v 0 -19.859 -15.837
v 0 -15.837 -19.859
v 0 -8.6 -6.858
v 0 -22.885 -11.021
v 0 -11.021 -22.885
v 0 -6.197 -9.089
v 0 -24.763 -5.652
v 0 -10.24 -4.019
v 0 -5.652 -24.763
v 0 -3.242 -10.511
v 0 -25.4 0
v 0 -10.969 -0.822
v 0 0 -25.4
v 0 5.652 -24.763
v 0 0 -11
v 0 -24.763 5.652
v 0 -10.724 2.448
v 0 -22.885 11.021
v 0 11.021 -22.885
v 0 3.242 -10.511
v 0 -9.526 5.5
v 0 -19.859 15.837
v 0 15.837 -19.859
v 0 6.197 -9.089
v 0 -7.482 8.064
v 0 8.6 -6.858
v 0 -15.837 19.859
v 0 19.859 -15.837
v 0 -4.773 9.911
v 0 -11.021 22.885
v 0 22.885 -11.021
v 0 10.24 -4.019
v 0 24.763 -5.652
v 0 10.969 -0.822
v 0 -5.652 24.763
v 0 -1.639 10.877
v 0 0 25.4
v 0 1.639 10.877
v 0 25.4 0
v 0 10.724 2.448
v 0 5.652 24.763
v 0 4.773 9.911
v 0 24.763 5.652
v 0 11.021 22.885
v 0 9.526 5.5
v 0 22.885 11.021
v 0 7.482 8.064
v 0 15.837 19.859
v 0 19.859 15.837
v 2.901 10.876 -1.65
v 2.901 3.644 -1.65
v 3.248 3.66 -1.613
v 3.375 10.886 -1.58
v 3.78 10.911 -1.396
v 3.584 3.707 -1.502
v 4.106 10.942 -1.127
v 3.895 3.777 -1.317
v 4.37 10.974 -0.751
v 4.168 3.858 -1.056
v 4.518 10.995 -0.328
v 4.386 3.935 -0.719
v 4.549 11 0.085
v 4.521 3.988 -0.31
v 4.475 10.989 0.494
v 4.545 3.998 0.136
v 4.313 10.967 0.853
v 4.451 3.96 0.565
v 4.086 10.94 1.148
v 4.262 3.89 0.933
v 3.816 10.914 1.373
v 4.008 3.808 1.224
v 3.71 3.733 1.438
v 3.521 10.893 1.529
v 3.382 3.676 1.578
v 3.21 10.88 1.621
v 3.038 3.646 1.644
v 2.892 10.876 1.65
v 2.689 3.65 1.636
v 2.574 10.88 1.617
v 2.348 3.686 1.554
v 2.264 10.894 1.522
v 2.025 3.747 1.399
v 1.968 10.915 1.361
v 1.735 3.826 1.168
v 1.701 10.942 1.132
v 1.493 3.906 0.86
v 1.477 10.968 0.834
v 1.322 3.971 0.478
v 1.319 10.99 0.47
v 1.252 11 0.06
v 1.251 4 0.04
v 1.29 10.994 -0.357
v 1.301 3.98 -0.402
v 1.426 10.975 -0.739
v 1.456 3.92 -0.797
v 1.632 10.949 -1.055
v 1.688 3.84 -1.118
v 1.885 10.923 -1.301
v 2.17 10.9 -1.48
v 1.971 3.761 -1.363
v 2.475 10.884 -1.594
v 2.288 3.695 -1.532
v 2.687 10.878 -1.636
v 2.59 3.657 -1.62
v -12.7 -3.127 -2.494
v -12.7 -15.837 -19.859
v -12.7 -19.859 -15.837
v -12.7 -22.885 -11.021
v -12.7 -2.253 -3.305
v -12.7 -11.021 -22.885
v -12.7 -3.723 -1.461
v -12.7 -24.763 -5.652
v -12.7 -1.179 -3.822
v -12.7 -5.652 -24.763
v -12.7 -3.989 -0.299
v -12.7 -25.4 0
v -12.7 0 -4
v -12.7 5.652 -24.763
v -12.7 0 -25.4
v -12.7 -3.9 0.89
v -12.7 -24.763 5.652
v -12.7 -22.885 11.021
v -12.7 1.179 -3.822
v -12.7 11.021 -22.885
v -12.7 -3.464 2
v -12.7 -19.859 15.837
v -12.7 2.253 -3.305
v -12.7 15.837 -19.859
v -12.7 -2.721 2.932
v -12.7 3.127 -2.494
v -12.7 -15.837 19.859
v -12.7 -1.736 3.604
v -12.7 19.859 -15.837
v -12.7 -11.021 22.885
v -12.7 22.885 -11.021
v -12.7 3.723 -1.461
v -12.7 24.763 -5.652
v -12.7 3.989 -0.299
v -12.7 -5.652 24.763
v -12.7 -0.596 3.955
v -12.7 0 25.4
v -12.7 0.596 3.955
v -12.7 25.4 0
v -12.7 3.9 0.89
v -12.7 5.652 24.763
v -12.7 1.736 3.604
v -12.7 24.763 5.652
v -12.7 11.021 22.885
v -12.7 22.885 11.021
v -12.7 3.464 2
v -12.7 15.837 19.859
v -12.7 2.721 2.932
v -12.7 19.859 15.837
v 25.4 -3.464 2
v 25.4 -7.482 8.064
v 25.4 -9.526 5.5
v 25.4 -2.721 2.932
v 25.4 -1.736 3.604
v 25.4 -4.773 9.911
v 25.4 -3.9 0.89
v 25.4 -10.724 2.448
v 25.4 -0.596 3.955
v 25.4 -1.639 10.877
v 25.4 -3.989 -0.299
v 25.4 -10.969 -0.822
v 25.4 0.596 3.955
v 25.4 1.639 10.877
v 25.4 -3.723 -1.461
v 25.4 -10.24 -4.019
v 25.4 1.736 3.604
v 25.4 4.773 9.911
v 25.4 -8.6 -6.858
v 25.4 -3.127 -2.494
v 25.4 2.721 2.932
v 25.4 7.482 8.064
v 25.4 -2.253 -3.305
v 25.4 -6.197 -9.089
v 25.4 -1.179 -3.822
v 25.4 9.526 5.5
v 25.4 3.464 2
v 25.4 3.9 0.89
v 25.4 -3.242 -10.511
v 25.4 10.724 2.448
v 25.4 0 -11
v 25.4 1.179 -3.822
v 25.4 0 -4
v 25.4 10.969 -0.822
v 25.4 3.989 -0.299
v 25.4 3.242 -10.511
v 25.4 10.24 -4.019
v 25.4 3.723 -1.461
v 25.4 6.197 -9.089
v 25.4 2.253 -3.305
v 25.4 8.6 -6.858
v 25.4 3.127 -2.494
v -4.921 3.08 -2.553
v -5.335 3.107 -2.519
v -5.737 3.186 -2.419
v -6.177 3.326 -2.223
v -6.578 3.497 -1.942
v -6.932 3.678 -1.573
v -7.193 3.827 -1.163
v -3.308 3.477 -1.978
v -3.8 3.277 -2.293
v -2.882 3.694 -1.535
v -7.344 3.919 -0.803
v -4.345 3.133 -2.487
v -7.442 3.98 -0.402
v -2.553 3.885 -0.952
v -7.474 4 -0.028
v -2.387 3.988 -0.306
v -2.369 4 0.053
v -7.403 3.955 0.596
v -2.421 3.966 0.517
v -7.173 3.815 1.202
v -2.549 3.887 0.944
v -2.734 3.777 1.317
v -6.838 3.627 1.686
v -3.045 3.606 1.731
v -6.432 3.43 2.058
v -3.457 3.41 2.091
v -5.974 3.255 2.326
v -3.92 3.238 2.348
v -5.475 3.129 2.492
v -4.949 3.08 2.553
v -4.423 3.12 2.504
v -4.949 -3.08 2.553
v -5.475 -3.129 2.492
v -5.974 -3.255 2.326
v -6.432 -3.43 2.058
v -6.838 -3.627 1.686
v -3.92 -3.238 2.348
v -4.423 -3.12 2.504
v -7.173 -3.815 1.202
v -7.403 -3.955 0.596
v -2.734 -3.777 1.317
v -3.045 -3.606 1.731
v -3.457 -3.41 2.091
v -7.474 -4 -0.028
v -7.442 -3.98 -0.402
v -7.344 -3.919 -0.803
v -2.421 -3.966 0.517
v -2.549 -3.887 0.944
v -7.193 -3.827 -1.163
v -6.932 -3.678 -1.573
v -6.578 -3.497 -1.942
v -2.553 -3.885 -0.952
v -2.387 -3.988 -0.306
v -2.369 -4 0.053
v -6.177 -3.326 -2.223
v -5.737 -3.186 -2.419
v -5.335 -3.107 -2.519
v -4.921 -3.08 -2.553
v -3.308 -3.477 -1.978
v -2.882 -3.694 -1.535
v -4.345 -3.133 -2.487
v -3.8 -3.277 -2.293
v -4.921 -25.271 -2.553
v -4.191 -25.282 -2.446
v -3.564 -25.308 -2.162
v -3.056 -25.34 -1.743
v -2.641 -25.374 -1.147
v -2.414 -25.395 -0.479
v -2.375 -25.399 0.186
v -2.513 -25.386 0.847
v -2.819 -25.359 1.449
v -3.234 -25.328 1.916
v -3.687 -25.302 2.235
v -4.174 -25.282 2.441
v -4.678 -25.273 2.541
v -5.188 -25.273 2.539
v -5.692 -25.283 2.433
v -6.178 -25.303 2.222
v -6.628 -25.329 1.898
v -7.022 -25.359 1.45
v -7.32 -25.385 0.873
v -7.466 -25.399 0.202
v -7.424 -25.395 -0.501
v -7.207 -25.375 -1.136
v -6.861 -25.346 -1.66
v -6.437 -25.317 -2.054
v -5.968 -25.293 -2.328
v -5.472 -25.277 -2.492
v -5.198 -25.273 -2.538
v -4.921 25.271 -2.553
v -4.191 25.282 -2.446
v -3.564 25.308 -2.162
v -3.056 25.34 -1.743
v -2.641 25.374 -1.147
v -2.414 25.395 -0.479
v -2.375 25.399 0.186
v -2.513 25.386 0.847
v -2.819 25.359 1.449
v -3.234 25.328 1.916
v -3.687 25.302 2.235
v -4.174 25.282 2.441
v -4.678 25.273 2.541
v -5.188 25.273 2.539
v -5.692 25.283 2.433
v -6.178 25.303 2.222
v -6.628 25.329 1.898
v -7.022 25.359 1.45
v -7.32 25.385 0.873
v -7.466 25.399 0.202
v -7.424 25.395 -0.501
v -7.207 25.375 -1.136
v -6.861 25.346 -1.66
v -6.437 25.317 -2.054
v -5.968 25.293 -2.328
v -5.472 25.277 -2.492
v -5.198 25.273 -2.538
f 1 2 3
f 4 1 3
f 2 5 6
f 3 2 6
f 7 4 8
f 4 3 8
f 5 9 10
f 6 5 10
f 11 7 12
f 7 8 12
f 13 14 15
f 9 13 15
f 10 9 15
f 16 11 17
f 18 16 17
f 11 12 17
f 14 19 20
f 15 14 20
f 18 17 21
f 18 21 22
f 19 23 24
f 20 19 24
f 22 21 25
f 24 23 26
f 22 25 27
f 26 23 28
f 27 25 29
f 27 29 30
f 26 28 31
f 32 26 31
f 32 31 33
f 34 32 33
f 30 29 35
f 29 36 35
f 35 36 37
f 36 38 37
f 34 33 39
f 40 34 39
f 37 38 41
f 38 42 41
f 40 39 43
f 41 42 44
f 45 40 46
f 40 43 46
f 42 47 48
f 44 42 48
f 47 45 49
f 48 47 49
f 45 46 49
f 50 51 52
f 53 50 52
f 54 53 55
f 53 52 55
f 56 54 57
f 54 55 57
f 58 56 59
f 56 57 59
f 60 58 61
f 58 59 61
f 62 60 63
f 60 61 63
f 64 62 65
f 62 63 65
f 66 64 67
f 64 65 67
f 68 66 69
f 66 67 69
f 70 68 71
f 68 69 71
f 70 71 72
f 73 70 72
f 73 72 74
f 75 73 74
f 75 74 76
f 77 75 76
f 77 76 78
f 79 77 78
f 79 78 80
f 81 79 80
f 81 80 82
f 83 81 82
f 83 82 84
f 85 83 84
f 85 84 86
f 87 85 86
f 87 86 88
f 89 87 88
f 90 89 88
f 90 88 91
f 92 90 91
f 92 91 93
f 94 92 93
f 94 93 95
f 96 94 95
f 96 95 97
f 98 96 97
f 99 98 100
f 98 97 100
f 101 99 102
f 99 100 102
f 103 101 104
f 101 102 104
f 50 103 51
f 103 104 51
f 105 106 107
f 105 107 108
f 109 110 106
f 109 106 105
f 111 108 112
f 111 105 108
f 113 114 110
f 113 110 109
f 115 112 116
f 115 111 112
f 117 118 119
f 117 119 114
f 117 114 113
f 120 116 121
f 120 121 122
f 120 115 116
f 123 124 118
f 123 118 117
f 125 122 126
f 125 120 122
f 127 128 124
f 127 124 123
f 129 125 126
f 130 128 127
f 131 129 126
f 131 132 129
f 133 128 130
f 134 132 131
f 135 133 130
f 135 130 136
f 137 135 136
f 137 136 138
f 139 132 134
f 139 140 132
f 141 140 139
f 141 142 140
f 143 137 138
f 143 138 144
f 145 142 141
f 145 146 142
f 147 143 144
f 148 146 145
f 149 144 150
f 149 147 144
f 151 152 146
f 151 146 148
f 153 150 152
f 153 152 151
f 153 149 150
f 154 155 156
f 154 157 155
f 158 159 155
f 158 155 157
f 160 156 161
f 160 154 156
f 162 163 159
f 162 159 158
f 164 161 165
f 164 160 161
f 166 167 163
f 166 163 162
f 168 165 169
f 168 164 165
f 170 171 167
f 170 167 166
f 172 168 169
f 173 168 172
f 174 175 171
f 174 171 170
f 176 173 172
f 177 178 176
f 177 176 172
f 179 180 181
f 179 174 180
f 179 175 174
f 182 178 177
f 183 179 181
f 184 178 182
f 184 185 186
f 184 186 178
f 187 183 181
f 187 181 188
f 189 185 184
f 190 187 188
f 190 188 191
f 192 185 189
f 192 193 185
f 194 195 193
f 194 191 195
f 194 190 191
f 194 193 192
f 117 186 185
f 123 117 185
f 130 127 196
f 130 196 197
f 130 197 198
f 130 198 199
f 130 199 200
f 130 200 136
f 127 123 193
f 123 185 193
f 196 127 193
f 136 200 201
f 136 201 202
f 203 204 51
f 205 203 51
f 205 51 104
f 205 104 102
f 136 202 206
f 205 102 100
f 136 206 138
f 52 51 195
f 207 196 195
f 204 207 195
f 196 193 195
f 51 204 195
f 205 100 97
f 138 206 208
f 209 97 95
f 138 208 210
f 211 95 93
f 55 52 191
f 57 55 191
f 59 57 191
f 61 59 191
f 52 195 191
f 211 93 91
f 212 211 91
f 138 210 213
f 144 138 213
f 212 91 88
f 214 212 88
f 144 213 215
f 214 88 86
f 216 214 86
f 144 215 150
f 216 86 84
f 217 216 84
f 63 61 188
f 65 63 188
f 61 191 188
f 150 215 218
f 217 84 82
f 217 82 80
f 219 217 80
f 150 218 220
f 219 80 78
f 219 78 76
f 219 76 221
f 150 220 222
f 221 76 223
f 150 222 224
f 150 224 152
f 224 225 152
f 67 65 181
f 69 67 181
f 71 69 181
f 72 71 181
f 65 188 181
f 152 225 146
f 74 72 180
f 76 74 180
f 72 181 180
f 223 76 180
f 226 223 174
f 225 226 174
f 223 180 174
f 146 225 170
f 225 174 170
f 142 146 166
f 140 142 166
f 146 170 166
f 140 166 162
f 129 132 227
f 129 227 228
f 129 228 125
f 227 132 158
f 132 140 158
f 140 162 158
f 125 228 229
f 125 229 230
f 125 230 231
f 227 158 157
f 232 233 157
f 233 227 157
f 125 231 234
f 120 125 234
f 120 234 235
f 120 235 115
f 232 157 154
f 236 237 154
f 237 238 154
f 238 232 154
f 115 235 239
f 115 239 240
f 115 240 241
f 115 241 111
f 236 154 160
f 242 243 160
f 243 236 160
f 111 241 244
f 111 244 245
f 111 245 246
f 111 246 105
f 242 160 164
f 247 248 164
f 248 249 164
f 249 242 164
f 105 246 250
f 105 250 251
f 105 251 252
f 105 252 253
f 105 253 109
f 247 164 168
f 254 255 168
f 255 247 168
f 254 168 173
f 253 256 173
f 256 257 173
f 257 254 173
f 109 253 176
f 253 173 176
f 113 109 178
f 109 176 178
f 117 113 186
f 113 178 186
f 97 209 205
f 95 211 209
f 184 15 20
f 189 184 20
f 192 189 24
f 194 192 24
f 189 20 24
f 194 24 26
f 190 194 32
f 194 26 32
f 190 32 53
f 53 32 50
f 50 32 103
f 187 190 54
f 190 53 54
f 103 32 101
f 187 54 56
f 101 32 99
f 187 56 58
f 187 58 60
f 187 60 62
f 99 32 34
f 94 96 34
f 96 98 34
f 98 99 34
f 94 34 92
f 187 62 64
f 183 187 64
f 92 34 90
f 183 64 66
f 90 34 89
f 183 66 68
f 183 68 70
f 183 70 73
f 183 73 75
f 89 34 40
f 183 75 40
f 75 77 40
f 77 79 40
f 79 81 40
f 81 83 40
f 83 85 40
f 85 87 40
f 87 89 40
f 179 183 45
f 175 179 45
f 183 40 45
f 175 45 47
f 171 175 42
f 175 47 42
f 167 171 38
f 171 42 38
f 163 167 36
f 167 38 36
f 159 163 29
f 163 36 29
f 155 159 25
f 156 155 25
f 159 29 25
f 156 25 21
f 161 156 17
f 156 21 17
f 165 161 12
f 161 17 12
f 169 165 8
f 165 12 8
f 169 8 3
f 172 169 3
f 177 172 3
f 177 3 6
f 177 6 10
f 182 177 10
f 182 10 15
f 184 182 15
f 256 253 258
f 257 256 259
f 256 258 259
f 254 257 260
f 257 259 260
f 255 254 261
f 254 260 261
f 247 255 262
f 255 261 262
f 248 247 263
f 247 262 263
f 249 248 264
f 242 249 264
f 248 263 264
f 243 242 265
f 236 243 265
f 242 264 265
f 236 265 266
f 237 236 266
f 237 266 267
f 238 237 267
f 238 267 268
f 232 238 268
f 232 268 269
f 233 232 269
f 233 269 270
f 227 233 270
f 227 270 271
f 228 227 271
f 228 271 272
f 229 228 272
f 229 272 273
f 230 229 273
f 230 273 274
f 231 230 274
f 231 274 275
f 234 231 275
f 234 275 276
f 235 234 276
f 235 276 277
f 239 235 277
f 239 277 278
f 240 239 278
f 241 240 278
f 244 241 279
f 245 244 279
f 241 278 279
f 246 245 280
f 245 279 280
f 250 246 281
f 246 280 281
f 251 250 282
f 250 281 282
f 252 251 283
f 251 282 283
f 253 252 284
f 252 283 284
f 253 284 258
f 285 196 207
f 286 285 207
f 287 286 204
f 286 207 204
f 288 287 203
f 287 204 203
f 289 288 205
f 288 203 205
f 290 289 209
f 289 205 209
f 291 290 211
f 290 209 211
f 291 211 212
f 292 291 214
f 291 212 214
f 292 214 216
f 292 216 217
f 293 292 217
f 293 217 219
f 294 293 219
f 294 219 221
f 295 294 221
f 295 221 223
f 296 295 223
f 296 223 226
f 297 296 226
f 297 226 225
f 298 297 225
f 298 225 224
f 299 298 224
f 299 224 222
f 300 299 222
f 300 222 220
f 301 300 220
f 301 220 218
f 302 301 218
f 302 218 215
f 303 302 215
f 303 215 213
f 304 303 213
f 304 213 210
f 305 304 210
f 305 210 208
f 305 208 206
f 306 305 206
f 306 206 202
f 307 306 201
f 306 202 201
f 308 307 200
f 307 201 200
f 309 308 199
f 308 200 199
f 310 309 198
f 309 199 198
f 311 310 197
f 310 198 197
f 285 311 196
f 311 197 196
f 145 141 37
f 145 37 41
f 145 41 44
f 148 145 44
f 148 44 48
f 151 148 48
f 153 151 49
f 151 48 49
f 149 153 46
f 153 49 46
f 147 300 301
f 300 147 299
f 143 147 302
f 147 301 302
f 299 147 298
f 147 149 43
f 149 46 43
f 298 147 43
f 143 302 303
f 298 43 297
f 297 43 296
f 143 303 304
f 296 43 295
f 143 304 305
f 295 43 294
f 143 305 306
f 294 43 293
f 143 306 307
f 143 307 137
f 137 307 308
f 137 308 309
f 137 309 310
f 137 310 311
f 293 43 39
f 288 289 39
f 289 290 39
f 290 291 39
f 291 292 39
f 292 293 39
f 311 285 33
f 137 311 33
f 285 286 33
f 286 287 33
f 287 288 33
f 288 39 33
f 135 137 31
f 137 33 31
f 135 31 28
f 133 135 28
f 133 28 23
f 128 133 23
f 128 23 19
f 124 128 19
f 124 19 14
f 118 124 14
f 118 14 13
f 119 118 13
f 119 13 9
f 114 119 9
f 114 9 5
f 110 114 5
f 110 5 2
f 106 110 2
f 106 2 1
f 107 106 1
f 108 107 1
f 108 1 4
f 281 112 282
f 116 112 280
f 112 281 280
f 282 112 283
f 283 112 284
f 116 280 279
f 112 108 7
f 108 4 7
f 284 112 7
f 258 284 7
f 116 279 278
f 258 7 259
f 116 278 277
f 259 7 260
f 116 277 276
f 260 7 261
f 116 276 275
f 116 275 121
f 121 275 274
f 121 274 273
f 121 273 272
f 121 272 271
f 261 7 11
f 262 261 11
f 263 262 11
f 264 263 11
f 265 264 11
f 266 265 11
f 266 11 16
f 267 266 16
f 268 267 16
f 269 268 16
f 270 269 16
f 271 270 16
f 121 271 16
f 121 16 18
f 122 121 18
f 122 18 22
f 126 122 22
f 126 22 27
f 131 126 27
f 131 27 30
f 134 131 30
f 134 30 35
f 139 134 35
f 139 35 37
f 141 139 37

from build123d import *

# Parameters (mm, degrees)
SKETCH2_R                 = 11
BOSS_EXTRUDE2_DEPTH       = 25.4
SKETCH7_R                 = 4
CUT_EXTRUDE3_DEPTH        = 26.4
SKETCH8_R                 = 25.4
BOSS_EXTRUDE3_DEPTH       = 12.7
SKETCH10_R                = 4
CUT_EXTRUDE5_DEPTH        = 13.7
F_1_4_20_TAPPED_HOLE1_D   = 5.1054
M4X0_7_TAPPED_HOLE2_D     = 3.3
M4X0_7_TAPPED_HOLE2_DEPTH = 11.176
M4X0_7_TAPPED_HOLE2_TIP   = 0.991420021


with BuildPart() as part:
    # Sketch2 → Boss-Extrude2 (new body)
    with BuildSketch(Plane(origin=(0, 0, 0), x_dir=(0, 0, -1), z_dir=(1, 0, 0))):
        Circle(SKETCH2_R)
    extrude(amount=BOSS_EXTRUDE2_DEPTH)

    # Sketch7 → Cut-Extrude3 (cut, through all)
    with BuildSketch(Plane(origin=(25.4, 0, 0), x_dir=(0, 0, -1), z_dir=(1, 0, 0))):
        Circle(SKETCH7_R)
    extrude(amount=-CUT_EXTRUDE3_DEPTH, mode=Mode.SUBTRACT)

    # Sketch8 → Boss-Extrude3 (add)
    with BuildSketch(Plane.ZY):
        Circle(SKETCH8_R)
    extrude(amount=BOSS_EXTRUDE3_DEPTH)

    # Sketch10 → Cut-Extrude5 (cut, through all)
    with BuildSketch(Plane(origin=(0, 0, 0), x_dir=(0, 0, -1), z_dir=(1, 0, 0))):
        Circle(SKETCH10_R)
    extrude(amount=-CUT_EXTRUDE5_DEPTH, mode=Mode.SUBTRACT)

    # 1/4-20 Tapped Hole1 (through all)
    with Locations(Plane(origin=(-4.921208149, 25.4, 0), x_dir=(0, 0, 1), z_dir=(0, 1, 0))):
        with Locations((0, 0)):
            Hole(F_1_4_20_TAPPED_HOLE1_D / 2)

    # M4x0.7 Tapped Hole2
    with Locations(Plane(origin=(2.900798662, 11, 0), x_dir=(0, 0, 1), z_dir=(0, 1, 0))):
        with Locations((0, 0)):
            Hole(M4X0_7_TAPPED_HOLE2_D / 2, depth=M4X0_7_TAPPED_HOLE2_DEPTH)
            with Locations((0, 0, -(M4X0_7_TAPPED_HOLE2_DEPTH + M4X0_7_TAPPED_HOLE2_TIP / 2))):  # 118° drill point
                Cone(0, M4X0_7_TAPPED_HOLE2_D / 2, M4X0_7_TAPPED_HOLE2_TIP, mode=Mode.SUBTRACT)


solid = part.part
